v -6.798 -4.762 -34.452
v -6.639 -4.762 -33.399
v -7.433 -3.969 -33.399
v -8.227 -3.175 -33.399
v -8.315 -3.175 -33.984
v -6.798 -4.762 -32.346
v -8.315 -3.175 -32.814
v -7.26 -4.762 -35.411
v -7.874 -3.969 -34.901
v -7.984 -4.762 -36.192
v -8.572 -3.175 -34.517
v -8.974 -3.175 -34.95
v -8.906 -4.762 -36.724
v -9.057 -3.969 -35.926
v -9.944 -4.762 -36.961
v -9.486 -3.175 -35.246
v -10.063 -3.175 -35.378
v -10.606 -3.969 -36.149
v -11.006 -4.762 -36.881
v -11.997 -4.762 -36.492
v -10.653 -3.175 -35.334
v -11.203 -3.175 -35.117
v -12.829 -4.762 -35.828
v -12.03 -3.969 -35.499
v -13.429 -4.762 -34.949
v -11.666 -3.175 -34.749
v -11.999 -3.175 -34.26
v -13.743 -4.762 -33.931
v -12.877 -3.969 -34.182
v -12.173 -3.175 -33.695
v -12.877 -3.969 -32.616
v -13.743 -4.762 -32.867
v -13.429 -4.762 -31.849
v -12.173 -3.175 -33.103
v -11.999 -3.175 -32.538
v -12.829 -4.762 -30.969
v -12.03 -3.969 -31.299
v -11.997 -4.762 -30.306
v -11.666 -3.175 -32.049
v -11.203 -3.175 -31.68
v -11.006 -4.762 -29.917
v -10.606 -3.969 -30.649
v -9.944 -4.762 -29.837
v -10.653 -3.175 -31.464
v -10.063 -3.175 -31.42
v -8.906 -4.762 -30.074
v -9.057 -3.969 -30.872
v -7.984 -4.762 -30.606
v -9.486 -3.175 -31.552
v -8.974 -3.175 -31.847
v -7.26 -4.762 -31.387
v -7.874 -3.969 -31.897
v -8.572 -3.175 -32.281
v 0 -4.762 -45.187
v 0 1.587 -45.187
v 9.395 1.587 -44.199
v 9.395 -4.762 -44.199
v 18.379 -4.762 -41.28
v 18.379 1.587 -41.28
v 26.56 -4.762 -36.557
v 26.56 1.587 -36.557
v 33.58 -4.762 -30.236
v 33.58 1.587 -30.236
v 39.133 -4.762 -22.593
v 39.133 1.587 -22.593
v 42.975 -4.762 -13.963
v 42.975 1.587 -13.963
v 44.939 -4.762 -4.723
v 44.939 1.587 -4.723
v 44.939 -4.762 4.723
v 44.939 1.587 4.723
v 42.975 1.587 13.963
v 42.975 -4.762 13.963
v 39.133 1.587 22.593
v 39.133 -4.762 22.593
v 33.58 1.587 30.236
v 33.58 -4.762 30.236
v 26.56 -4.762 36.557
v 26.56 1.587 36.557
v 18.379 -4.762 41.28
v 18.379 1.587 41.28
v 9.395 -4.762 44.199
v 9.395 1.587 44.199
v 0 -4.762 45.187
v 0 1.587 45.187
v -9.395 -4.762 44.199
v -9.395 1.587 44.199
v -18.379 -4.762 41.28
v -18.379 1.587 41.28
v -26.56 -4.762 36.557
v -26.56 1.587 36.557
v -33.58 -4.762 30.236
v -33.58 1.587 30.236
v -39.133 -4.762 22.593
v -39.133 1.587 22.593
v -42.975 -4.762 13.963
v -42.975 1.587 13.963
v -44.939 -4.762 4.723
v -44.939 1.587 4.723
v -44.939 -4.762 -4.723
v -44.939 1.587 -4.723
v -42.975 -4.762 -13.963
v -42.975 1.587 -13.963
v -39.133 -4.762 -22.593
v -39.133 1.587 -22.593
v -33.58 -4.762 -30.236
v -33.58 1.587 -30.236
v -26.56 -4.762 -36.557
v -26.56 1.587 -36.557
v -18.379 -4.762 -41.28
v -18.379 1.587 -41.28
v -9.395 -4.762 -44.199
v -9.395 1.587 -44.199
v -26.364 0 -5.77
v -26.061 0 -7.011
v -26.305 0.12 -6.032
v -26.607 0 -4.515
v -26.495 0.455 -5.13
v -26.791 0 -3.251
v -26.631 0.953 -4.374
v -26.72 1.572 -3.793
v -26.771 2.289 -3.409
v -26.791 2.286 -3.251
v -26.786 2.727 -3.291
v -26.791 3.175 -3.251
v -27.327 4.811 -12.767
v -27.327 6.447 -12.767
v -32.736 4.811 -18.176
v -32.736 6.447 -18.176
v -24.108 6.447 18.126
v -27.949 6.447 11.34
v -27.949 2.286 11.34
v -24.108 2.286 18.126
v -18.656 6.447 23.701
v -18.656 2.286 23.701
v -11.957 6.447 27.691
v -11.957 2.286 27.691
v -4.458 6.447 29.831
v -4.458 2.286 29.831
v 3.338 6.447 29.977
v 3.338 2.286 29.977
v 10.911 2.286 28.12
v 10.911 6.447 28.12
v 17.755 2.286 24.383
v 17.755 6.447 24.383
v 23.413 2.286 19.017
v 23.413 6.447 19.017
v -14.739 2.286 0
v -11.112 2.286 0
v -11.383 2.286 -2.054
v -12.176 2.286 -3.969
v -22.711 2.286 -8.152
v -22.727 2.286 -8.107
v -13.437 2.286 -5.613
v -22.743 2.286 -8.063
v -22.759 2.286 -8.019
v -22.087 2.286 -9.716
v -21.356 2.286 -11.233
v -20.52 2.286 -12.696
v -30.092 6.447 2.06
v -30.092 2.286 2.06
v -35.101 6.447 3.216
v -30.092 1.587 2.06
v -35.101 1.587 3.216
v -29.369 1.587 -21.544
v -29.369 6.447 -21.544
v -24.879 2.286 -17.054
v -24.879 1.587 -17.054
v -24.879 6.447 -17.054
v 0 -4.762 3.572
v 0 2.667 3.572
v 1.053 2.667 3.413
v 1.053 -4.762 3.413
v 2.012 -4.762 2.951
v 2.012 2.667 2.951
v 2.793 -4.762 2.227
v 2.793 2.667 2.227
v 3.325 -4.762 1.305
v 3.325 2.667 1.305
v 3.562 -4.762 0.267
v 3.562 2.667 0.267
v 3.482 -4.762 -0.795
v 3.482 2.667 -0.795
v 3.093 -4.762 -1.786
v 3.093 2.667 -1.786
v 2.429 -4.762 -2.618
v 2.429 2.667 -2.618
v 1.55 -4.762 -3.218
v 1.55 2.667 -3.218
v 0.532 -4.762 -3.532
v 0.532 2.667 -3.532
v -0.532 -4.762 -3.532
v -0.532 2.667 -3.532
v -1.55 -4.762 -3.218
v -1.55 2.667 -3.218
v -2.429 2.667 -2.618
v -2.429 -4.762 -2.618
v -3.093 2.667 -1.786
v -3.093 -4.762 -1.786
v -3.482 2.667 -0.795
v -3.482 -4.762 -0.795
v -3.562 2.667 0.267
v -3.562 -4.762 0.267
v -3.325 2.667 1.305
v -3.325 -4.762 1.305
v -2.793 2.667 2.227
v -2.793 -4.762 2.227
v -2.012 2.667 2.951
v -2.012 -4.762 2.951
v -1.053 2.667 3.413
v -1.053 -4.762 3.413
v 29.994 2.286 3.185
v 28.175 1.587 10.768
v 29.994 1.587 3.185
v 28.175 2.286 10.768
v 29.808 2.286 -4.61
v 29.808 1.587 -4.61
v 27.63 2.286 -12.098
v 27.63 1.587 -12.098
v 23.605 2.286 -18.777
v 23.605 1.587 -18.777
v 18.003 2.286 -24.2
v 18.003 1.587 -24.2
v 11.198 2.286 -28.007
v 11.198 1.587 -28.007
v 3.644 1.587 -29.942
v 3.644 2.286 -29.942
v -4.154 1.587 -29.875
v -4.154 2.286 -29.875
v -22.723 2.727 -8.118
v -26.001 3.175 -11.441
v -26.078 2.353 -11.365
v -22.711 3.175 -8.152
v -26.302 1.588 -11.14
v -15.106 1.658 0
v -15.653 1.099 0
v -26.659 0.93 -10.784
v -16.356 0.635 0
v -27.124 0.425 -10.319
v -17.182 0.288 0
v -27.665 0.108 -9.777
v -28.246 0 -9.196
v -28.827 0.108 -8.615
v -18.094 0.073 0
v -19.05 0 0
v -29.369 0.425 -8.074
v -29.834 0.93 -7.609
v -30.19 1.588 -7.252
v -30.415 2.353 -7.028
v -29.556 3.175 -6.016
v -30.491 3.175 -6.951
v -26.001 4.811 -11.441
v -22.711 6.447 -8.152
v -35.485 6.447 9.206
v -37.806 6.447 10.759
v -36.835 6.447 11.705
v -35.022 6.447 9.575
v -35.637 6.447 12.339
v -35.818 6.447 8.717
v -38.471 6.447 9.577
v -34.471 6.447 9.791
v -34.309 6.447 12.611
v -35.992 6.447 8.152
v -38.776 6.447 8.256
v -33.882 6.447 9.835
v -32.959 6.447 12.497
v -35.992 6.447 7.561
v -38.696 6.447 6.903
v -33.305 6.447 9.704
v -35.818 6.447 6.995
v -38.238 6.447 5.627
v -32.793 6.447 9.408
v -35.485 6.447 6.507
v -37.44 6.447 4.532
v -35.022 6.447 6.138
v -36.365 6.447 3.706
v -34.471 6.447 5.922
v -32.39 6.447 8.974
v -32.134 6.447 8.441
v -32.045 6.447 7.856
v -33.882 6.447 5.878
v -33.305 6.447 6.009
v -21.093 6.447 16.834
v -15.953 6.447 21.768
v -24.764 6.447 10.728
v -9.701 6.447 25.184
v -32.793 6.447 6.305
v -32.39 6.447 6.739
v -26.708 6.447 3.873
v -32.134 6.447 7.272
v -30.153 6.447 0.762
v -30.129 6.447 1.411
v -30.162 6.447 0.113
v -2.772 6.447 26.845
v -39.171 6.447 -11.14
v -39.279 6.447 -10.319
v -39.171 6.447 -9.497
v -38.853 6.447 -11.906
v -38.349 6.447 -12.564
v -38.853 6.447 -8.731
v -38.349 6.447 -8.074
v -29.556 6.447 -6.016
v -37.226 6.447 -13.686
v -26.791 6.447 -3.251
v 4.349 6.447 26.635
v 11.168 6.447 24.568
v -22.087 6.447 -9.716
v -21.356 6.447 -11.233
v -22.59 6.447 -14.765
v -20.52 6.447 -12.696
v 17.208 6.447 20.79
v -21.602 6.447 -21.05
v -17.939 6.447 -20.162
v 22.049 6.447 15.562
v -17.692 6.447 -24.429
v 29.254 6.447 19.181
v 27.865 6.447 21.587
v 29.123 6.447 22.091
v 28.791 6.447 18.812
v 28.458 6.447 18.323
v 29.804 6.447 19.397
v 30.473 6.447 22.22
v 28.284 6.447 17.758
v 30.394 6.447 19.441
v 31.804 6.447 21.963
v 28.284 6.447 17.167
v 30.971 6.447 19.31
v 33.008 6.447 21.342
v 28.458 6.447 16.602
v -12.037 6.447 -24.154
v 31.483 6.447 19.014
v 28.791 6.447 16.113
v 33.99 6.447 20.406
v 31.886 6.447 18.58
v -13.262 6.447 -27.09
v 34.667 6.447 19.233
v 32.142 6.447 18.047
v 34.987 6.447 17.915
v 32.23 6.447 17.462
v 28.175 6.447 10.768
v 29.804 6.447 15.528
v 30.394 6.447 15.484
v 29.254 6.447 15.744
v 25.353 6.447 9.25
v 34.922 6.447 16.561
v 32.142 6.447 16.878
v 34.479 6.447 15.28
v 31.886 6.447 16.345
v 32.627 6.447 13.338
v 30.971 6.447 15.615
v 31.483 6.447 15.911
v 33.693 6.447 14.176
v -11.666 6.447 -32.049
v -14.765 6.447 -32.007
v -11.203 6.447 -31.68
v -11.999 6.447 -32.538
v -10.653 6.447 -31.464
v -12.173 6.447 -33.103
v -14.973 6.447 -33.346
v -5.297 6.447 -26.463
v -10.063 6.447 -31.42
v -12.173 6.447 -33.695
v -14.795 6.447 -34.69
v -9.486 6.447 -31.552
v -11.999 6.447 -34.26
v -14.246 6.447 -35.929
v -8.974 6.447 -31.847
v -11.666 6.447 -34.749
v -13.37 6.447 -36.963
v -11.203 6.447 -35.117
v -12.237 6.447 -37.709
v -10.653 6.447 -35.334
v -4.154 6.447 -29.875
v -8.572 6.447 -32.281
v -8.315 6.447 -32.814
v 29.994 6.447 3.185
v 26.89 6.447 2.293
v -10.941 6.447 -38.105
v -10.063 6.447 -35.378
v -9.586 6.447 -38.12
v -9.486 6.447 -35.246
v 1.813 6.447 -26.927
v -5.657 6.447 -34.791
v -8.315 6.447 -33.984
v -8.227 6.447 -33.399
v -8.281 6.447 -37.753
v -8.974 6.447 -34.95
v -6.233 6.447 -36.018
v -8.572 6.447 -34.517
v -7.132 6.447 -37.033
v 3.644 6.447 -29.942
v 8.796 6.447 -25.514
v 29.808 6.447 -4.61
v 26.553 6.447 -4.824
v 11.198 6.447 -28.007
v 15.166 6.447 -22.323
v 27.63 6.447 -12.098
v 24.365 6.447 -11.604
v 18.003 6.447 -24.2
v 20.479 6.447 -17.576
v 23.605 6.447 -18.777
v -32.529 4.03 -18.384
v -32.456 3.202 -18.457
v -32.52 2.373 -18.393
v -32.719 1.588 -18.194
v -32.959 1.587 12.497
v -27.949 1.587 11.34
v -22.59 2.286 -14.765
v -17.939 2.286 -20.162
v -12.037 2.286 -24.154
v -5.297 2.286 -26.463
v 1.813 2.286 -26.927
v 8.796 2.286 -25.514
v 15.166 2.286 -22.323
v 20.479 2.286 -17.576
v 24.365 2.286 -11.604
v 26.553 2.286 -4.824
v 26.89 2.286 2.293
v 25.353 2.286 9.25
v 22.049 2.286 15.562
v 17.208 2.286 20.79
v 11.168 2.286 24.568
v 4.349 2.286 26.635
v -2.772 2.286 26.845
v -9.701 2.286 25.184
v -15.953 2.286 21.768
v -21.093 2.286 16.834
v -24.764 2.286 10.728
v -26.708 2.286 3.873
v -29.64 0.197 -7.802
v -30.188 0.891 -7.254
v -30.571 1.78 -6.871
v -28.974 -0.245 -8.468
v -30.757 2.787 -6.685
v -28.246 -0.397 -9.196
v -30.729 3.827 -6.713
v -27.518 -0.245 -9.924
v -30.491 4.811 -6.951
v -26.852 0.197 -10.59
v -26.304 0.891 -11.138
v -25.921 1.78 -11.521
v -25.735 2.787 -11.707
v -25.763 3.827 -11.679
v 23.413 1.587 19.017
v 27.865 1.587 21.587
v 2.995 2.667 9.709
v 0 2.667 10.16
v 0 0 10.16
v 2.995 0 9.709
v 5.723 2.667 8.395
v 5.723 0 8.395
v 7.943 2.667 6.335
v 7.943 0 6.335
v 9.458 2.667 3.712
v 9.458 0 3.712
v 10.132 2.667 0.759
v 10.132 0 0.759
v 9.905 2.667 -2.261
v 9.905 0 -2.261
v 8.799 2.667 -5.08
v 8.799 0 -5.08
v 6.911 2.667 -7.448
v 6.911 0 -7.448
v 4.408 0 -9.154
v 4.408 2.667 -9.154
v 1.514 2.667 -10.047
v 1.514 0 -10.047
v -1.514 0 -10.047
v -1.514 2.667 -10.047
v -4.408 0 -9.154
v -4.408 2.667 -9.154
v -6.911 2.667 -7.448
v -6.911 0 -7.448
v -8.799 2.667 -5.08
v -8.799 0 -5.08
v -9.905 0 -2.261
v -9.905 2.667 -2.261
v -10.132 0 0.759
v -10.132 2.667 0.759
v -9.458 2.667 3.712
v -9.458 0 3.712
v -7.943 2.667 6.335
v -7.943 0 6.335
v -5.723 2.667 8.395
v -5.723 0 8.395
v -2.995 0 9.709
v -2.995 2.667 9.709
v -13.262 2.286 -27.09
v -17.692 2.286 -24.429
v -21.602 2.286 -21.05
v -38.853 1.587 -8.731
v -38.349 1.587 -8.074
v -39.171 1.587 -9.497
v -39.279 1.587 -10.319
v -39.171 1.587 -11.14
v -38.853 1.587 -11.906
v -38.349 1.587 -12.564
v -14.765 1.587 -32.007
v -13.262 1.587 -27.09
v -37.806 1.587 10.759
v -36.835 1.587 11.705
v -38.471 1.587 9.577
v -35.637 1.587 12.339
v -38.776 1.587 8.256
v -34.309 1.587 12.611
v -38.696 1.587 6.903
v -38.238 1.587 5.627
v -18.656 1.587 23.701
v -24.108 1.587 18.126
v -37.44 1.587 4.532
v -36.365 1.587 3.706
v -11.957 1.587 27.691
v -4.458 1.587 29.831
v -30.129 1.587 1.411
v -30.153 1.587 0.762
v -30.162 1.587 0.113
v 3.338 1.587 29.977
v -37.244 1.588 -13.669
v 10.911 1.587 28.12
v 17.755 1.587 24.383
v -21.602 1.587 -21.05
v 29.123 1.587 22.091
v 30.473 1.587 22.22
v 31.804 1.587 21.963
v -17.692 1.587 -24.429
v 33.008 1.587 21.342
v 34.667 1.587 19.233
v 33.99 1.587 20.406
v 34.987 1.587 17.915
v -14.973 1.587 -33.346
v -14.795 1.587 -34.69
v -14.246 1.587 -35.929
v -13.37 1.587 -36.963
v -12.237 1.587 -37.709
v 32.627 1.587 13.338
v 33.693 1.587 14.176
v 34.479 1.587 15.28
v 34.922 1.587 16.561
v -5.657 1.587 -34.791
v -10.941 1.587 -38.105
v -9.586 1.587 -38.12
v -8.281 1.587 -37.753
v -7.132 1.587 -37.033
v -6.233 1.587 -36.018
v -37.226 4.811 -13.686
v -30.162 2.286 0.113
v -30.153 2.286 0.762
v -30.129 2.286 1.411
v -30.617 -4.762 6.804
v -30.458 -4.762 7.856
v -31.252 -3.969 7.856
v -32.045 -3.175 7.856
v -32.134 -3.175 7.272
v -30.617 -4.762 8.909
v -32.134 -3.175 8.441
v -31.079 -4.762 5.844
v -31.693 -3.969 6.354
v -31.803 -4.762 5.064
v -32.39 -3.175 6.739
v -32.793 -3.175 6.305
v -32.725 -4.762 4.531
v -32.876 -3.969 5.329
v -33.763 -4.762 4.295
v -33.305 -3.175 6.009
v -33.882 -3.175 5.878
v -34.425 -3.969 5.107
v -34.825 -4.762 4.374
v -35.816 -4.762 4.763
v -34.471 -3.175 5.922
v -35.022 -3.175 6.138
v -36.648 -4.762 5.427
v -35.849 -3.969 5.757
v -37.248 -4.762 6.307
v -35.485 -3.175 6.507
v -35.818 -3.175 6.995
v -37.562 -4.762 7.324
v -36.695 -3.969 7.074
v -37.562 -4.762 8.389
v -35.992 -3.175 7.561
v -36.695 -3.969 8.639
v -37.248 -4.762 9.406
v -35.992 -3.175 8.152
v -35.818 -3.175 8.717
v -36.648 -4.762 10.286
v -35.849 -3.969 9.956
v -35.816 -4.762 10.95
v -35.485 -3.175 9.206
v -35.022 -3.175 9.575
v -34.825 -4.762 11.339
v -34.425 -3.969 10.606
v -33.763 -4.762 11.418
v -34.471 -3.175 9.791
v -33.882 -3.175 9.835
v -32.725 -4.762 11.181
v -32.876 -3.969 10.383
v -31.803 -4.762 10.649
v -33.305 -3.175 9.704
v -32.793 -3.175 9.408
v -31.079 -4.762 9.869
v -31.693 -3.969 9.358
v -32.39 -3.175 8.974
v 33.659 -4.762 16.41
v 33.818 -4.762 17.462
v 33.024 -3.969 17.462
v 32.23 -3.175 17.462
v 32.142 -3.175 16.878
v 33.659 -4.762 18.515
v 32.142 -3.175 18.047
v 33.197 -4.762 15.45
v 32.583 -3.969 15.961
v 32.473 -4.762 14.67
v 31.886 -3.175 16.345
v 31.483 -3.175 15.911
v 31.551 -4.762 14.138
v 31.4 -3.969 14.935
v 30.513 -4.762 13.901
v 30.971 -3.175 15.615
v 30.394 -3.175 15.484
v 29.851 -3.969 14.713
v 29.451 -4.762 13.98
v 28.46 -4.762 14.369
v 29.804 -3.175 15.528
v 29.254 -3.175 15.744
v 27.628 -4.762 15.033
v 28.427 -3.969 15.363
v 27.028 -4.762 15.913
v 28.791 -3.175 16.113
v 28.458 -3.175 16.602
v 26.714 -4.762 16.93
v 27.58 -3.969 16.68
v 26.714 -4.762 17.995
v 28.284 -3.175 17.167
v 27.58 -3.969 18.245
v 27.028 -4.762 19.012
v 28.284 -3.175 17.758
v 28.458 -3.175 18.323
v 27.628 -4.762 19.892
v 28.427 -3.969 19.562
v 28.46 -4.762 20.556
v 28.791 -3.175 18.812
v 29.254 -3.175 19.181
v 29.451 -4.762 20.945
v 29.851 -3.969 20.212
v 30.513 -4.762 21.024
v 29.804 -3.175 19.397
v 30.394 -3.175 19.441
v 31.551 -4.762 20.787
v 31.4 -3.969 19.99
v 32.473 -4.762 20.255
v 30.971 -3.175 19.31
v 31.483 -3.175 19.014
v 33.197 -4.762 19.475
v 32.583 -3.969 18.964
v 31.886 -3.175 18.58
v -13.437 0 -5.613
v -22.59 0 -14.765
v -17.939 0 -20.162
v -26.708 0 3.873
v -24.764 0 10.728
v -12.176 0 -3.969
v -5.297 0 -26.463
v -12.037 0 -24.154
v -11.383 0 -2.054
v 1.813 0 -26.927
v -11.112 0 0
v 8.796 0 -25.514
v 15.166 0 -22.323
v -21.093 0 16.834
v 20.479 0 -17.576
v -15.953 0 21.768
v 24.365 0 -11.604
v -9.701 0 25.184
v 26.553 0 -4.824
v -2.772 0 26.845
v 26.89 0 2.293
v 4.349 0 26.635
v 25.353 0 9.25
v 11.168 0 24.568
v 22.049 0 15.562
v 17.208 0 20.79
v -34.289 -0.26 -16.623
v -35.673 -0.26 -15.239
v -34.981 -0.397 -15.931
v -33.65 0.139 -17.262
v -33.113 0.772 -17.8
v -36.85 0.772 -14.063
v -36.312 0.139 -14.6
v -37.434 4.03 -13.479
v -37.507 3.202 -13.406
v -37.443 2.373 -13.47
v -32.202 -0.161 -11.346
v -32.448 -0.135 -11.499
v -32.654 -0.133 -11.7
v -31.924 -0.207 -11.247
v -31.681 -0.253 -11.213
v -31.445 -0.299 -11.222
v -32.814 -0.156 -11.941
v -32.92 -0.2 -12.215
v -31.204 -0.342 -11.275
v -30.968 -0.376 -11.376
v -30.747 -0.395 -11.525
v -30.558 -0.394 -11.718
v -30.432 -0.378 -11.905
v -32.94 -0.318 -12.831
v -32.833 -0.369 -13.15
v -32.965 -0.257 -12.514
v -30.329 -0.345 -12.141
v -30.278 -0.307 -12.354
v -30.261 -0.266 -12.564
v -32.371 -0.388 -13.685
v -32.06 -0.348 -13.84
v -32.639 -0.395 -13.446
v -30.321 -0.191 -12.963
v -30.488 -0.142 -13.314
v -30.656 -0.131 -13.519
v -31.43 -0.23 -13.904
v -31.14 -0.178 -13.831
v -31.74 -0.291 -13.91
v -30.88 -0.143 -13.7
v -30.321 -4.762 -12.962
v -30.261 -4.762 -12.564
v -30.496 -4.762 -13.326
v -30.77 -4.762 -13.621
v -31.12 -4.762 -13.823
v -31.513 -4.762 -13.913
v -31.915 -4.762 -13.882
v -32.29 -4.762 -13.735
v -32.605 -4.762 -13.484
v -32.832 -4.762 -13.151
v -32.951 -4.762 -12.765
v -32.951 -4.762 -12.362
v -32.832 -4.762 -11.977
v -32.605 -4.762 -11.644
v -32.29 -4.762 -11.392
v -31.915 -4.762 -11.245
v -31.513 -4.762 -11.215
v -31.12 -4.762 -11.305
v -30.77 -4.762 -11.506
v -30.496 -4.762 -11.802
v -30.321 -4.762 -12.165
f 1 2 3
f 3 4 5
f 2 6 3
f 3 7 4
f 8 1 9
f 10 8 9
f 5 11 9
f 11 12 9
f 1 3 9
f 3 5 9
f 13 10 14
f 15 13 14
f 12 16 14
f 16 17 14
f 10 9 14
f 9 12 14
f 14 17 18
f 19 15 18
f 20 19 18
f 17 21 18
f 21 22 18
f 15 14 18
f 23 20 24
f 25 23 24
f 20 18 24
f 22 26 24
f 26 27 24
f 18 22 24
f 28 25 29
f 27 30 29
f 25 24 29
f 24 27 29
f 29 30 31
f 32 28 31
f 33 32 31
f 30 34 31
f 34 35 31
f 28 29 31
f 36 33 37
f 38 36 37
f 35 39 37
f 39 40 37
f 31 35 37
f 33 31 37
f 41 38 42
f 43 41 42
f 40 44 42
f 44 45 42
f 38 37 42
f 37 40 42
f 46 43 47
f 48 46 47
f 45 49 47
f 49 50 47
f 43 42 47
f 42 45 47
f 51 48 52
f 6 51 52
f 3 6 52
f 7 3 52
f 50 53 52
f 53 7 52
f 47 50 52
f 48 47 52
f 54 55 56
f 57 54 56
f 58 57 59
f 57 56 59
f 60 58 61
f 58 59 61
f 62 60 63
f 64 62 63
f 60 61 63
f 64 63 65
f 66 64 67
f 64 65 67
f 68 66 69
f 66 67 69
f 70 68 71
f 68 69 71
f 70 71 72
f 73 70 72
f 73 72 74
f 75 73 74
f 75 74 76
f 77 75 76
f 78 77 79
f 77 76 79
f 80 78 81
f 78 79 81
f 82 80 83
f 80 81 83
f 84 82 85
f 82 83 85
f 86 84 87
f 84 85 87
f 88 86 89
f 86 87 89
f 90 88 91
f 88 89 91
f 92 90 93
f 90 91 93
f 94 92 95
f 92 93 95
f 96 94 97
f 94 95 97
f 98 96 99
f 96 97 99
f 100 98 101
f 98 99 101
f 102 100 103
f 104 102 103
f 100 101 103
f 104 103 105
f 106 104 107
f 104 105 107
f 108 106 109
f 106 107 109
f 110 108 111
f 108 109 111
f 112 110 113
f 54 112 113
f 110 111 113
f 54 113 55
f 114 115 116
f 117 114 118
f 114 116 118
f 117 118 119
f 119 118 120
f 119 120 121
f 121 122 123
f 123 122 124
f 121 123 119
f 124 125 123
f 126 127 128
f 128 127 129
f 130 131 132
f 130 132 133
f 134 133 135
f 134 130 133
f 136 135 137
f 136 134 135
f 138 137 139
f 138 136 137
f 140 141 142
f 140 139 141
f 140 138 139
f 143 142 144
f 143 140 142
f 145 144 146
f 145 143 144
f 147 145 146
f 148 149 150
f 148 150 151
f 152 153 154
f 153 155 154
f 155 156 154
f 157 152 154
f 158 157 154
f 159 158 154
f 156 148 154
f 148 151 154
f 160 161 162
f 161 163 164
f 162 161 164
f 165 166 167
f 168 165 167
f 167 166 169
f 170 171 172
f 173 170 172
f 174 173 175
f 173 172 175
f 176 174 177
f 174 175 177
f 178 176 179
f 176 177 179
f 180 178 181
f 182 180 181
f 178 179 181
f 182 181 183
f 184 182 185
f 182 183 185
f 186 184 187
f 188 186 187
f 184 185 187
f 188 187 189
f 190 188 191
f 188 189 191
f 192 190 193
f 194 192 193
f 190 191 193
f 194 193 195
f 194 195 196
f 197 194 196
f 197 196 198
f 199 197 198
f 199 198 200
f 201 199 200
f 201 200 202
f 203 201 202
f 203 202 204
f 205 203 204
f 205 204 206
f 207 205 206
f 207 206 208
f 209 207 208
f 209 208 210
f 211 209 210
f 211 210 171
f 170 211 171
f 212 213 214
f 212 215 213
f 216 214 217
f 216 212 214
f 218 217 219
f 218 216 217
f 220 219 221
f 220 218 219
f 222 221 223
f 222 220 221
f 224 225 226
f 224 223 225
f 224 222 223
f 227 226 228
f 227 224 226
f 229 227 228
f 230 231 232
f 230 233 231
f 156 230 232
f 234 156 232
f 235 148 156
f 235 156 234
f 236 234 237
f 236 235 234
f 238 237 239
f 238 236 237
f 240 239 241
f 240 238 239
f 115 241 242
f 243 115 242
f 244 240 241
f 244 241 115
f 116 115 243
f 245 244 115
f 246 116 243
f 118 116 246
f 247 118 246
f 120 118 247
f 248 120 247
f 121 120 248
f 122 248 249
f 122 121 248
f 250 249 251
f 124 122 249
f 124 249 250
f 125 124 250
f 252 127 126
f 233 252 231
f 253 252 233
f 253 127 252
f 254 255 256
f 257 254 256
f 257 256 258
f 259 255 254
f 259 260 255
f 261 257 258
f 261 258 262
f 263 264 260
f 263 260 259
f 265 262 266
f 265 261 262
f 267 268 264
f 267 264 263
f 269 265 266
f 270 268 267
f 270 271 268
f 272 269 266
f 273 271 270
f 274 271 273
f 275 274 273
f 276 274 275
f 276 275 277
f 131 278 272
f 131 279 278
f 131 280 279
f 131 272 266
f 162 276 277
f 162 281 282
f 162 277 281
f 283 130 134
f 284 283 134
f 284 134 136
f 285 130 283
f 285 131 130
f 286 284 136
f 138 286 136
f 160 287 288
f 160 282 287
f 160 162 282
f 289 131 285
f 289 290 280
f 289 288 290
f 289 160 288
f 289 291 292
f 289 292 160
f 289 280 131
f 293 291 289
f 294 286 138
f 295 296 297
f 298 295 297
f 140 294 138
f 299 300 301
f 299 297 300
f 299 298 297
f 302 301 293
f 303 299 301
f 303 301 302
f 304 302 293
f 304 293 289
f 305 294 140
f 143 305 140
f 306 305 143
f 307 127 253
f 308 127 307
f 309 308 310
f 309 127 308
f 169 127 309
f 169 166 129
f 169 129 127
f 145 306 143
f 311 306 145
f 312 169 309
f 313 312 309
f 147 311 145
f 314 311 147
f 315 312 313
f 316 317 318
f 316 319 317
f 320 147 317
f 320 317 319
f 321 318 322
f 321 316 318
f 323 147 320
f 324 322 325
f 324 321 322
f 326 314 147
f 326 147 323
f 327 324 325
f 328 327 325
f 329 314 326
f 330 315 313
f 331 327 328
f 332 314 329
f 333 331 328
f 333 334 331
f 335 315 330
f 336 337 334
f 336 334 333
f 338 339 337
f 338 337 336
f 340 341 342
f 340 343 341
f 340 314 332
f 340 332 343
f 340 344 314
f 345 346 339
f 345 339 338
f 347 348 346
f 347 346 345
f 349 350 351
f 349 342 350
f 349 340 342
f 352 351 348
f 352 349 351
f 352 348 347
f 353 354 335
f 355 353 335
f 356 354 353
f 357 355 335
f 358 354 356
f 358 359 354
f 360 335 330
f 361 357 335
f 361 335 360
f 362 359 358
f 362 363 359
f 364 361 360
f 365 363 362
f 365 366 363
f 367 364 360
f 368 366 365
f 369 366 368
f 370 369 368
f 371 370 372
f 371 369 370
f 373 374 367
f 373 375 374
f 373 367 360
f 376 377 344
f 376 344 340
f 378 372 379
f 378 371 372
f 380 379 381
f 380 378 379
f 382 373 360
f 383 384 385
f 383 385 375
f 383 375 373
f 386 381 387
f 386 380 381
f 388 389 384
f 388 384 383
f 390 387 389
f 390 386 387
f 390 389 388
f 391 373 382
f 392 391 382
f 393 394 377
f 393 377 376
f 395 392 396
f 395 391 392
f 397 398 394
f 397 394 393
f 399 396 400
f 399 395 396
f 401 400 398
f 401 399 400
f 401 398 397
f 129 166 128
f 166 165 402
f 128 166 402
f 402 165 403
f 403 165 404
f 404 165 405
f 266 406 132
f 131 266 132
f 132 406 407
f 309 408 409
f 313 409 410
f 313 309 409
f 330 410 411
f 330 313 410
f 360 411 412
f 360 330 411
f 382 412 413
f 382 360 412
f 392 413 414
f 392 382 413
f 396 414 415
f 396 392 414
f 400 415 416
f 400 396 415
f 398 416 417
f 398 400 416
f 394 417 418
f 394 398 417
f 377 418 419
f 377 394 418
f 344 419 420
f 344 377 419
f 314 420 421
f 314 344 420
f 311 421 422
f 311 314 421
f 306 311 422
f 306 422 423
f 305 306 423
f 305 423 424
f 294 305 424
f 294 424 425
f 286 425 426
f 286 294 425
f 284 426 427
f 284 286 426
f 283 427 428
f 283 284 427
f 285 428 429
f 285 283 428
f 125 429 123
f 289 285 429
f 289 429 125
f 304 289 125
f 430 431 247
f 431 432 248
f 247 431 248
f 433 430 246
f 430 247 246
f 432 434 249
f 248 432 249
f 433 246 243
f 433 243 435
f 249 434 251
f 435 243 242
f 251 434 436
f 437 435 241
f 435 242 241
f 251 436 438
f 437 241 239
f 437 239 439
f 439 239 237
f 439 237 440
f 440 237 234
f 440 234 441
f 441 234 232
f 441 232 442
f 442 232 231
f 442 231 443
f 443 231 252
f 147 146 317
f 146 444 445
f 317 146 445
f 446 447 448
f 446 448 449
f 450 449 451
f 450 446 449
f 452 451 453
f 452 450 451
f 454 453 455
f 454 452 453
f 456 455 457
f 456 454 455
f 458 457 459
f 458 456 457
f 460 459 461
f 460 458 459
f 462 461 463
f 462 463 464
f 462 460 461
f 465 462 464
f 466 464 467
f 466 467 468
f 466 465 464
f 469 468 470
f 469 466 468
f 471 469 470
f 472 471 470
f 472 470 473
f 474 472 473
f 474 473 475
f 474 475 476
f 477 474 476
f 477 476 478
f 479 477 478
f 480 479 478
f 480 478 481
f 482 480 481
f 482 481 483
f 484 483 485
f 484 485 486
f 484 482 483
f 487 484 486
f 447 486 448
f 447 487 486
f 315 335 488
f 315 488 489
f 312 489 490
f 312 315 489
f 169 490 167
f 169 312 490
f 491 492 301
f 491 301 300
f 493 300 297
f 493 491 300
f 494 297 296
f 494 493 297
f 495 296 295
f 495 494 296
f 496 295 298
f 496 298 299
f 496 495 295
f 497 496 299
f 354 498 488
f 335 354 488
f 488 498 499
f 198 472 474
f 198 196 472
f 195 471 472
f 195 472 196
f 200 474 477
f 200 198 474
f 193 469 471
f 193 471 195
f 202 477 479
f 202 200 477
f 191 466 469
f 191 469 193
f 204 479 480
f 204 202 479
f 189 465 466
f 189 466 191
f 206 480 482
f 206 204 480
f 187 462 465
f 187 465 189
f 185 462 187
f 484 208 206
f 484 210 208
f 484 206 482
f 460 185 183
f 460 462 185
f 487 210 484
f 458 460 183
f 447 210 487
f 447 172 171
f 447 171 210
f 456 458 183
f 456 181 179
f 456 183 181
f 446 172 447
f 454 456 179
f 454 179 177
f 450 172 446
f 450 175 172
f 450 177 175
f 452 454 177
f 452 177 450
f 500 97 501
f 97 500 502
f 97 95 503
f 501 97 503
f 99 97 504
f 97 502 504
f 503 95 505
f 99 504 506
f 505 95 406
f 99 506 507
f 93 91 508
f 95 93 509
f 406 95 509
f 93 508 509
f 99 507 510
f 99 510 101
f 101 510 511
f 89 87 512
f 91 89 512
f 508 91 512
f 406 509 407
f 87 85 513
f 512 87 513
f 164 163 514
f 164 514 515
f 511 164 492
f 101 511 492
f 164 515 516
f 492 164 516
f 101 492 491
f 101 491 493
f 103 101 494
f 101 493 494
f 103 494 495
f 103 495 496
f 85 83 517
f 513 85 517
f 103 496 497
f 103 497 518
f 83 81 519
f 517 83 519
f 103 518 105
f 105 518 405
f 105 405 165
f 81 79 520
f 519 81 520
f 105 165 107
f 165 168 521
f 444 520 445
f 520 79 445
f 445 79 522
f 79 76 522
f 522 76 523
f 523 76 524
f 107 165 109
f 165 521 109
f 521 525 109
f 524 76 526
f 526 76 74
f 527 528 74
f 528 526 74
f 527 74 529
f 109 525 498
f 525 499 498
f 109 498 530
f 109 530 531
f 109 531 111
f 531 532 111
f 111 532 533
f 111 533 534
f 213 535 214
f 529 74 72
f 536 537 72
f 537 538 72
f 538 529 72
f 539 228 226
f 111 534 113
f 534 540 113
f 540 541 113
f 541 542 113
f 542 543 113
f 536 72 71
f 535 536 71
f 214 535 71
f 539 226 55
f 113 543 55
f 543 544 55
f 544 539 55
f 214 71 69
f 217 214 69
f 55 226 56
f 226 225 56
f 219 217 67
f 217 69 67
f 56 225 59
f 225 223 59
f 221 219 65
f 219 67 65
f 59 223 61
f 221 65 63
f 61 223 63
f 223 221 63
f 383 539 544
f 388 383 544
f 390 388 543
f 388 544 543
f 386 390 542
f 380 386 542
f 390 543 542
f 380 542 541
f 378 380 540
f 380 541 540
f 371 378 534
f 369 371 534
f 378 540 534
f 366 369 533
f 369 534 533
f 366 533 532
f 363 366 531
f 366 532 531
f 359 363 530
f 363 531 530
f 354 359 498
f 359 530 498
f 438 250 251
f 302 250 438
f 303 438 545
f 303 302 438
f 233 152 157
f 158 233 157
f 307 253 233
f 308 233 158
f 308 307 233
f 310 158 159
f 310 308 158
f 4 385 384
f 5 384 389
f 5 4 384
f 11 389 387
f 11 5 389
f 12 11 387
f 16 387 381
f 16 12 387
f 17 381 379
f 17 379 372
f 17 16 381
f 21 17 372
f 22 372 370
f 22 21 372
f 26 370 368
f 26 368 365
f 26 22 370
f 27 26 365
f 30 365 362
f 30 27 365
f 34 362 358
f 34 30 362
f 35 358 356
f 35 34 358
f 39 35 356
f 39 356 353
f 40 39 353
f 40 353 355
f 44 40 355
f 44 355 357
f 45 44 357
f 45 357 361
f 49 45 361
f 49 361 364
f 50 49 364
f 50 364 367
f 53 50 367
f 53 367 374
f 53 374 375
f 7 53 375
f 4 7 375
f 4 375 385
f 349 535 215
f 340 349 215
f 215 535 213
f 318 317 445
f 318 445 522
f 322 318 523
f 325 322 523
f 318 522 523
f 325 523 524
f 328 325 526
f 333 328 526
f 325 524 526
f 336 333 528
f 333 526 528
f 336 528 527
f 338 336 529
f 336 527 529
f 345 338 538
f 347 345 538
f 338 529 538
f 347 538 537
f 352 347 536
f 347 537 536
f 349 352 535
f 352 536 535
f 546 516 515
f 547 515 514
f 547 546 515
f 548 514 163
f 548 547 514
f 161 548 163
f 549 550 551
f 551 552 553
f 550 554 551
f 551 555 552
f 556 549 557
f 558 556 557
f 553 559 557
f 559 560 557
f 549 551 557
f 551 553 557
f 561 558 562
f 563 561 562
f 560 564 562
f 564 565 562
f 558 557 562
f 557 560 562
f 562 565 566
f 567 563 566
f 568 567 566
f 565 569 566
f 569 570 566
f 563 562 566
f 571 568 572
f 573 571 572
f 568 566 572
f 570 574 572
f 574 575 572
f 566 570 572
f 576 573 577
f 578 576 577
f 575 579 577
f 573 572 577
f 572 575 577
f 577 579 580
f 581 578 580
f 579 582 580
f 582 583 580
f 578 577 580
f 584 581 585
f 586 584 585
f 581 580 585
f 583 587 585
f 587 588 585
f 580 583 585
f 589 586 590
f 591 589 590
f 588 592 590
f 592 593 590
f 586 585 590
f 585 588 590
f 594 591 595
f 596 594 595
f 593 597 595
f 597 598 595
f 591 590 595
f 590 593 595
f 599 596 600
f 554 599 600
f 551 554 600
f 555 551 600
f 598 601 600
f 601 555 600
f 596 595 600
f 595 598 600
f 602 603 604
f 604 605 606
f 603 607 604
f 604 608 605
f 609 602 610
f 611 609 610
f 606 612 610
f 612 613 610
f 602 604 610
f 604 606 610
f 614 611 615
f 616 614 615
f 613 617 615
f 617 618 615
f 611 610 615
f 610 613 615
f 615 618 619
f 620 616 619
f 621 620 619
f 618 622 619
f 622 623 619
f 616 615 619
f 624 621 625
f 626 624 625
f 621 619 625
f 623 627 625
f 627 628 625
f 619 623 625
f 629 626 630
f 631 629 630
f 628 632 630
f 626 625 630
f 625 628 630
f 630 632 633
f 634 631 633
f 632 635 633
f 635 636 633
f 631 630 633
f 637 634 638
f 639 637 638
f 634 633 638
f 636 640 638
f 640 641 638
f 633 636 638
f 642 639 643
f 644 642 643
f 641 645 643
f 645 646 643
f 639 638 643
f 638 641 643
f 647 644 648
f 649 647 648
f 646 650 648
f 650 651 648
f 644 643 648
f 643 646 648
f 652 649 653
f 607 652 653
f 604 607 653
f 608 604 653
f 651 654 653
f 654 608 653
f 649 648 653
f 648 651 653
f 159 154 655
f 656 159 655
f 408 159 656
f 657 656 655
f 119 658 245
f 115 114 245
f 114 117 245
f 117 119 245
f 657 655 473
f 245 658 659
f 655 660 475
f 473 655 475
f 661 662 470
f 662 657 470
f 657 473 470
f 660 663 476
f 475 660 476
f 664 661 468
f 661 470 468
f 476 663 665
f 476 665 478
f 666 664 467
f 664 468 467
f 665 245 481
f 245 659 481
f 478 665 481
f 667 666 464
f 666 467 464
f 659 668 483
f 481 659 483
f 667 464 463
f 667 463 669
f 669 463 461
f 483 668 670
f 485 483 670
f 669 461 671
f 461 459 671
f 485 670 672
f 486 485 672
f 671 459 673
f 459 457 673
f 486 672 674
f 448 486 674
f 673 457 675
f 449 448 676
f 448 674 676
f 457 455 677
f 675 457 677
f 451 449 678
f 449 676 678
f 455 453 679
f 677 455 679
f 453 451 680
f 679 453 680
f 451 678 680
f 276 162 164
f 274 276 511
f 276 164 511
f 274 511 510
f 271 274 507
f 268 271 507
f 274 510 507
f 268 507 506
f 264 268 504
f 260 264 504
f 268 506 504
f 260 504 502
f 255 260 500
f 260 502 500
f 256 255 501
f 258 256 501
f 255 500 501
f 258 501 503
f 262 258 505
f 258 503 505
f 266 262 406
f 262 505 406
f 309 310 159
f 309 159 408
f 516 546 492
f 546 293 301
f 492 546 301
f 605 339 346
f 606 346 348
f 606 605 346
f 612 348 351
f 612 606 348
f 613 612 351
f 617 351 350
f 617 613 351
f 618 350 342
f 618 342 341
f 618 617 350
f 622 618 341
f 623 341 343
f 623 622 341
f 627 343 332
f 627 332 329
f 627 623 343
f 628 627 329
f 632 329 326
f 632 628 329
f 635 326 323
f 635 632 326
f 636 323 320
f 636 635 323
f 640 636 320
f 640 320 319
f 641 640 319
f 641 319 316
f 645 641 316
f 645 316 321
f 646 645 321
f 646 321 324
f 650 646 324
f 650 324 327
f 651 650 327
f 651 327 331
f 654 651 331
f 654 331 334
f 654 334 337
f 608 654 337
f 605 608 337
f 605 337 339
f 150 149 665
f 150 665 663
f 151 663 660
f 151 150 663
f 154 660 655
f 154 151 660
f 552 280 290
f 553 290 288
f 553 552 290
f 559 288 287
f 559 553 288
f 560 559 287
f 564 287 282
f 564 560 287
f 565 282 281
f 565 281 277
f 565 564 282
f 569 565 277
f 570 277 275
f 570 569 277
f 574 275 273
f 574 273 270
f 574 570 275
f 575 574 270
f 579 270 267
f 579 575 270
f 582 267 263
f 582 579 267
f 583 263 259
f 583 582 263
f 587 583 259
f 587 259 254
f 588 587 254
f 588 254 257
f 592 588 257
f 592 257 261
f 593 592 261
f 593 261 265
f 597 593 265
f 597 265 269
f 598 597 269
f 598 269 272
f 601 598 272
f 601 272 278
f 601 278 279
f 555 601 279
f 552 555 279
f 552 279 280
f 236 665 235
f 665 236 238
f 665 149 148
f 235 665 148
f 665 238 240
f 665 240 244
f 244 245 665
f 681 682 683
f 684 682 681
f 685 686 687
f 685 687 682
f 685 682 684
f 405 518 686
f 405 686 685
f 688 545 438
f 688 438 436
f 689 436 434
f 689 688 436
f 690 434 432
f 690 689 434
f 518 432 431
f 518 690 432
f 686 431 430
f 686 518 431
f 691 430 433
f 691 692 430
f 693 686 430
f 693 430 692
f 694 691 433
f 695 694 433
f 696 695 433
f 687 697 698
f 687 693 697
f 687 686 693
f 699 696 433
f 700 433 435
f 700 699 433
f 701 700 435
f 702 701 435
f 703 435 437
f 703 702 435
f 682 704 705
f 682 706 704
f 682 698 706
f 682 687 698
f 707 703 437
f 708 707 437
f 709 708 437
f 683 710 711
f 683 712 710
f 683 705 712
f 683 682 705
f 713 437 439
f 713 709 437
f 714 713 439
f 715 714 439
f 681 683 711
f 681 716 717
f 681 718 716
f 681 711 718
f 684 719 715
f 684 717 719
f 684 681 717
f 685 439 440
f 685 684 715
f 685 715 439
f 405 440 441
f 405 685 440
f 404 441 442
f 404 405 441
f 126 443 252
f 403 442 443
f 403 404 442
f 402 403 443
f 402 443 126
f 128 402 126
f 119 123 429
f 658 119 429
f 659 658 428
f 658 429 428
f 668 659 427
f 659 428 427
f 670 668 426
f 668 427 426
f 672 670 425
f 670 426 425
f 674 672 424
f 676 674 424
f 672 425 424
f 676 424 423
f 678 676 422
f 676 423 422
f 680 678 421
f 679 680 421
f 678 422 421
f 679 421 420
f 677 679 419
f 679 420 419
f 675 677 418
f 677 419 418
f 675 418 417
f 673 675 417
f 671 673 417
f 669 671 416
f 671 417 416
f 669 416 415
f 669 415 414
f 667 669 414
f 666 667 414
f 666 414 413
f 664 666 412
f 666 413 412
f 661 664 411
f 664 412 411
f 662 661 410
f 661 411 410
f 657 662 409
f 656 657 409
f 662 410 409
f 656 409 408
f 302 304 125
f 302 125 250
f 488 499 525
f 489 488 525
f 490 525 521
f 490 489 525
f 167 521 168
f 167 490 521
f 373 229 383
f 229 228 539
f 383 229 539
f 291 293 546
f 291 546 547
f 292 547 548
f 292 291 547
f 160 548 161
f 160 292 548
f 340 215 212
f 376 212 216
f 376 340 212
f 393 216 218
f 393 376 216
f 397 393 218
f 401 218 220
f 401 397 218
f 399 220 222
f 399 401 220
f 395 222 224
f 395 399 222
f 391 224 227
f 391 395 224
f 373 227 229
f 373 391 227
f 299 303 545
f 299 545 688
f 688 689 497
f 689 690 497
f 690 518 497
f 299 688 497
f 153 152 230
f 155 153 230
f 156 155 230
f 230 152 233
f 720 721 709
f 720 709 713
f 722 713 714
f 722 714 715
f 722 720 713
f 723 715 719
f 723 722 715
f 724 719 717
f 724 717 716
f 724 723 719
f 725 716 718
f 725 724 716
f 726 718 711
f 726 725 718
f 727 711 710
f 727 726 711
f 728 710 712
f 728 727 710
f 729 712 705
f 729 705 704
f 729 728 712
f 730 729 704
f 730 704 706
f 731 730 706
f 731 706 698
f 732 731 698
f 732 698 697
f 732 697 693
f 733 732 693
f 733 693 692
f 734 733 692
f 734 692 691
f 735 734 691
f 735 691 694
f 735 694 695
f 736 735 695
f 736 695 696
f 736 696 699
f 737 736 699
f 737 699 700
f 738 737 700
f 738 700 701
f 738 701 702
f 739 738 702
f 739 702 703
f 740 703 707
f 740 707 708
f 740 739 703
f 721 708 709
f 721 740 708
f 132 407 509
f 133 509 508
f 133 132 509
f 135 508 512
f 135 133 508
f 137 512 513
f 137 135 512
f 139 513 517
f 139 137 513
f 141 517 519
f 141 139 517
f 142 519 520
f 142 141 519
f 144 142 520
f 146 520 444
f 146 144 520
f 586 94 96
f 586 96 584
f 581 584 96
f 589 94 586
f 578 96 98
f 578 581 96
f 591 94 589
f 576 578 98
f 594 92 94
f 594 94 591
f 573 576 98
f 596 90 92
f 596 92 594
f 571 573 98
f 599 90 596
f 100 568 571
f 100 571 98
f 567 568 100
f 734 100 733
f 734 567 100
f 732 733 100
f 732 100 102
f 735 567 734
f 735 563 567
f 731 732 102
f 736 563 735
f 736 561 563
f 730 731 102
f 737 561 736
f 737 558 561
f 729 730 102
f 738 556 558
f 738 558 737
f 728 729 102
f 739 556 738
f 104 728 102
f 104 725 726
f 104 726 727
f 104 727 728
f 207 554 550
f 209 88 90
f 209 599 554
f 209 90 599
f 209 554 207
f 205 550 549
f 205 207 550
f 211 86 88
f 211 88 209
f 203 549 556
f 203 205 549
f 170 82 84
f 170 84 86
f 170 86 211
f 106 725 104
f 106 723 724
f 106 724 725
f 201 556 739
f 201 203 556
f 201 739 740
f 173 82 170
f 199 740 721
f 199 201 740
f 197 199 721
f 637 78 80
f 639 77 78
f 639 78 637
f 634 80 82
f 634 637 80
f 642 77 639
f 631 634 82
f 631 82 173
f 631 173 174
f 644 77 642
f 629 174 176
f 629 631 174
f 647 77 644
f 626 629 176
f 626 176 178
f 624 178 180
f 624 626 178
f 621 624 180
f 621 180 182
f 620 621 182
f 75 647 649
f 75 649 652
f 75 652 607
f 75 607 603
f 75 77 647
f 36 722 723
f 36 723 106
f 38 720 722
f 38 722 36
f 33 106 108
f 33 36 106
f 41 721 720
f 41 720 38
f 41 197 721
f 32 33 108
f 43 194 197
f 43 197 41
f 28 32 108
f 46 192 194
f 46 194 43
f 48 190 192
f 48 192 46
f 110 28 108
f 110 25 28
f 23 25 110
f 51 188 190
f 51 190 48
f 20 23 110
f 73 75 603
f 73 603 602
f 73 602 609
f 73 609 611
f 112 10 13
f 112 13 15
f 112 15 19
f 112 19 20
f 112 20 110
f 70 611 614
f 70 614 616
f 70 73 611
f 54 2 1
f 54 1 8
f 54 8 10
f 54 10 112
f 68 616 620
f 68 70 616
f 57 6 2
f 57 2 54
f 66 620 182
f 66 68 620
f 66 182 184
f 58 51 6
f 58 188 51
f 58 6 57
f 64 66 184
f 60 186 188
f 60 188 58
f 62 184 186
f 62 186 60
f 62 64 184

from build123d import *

# Parameters (mm, degrees)
SKETCH1_R          = 30.1625
SKETCH1_R_2        = 3.571875
EXTRUDE1_DEPTH     = 4.7625
EXTRUDE2_START     = 2.286
SKETCH2_R          = 30.1625
SKETCH2_R_2        = 26.9875
EXTRUDE2_DEPTH     = 2.286
EXTRUDE3_START     = 2.286
EXTRUDE3_DEPTH     = 2.286
CUT_EXTRUDE1_START = -2.286
CUT_EXTRUDE1_DEPTH = 2.286
EXTRUDE4_START     = 4.16052
EXTRUDE4_DEPTH     = 4.16052
EXTRUDE6_START     = -4.7625
EXTRUDE6_DEPTH     = 4.7625
EXTRUDE7_START     = 6.44652
EXTRUDE7_DEPTH     = 6.44652
FILLET1_R          = 3.175
EXTRUDE8_START     = -4.7625
EXTRUDE8_OUTLINE_R = 1.984375
EXTRUDE8_DEPTH     = 11.20902
EXTRUDE8_START_2   = -36.000693059
EXTRUDE8_2_DEPTH   = 9.525
EXTRUDE9_START     = 2.667
SKETCH11_R         = 10.16
SKETCH11_R_2       = 3.571875
EXTRUDE9_DEPTH     = 2.667
SPLIT1_START       = -4.7625
SPLIT1_OUTLINE_R   = 1.35255
SPLIT1_DEPTH       = 11.20902
EXTRUDE10_START    = -6.35
SKETCH13_R         = 45.1866
EXTRUDE10_DEPTH    = 6.35


# Read off the part's stored shape, not the designer's step: Extrude8, Split1
with BuildPart() as part:
    # Sketch1 → Extrude1 (new body)
    with BuildSketch(Plane(origin=(0, 0, 0), x_dir=(1, 0, 0), z_dir=(0, 1, 0))):
        with Locations(Location((0, 0, 0), (0, 0, 270))):
            Circle(SKETCH1_R)
        with Locations(Location((0, 0, 0), (0, 0, 270))):
            Circle(SKETCH1_R_2, mode=Mode.SUBTRACT)
    extrude(amount=-EXTRUDE1_DEPTH)

    # Sketch2 → Extrude2 (add)
    with BuildSketch(Plane(origin=(0, 0, 0), x_dir=(-1, 0, 0), z_dir=(0, 1, 0)).offset(EXTRUDE2_START)):
        with Locations(Location((0, 0, 0), (0, 0, 90))):
            Circle(SKETCH2_R)
        with Locations(Location((0, 0, 0), (0, 0, 90))):
            Circle(SKETCH2_R_2, mode=Mode.SUBTRACT)
    extrude(amount=-EXTRUDE2_DEPTH)

    # Sketch3 → Extrude3 (add)
    with BuildSketch(Plane(origin=(0, 0, 0), x_dir=(-1, 0, 0), z_dir=(0, 1, 0)).offset(EXTRUDE3_START)):
        with BuildLine():
            Line((24.919808713, -10.359936774), (14.559871939, 0))
            Line((14.559871939, 0), (11.1125, 0))
            ThreePointArc((11.1125, 0), (11.716706211, -3.037549744), (13.437339924, -5.612660076))
            Line((13.437339924, -5.612660076), (22.590031817, -14.765351968))
            ThreePointArc((22.590031817, -14.765351968), (23.856826226, -12.616536715), (24.919808713, -10.359936774))
        make_face()
    extrude(amount=-EXTRUDE3_DEPTH)

    # Sketch4 → Cut-Extrude1 (cut)
    with BuildSketch(Plane(origin=(0, 2.286, 0), x_dir=(-1, 0, 0), z_dir=(0, 1, 0)).offset(CUT_EXTRUDE1_START)):
        with BuildLine():
            Line((27.327148629, -12.767276689), (24.919808713, -10.359936774))
            ThreePointArc((24.919808713, -10.359936774), (26.098589577, -6.86940888), (26.790988464, -3.250860404))
            Line((26.790988464, -3.250860404), (29.556401367, -6.016273306))
            ThreePointArc((29.556401367, -6.016273306), (28.64137875, -9.457686268), (27.327148629, -12.767276689))
        make_face()
    extrude(amount=CUT_EXTRUDE1_DEPTH, mode=Mode.SUBTRACT)

    # Sketch5 → Extrude4 (add)
    with BuildSketch(Plane(origin=(0, 2.286, 0), x_dir=(-1, 0, 0), z_dir=(0, 1, 0)).offset(EXTRUDE4_START)):
        with BuildLine():
            ThreePointArc((29.556401367, -6.016273306), (-28.64137875, 9.457686268), (27.327148629, -12.767276689))
            Line((27.327148629, -12.767276689), (22.711429166, -8.151557227))
            ThreePointArc((22.711429166, -8.151557227), (21.734904661, -10.480974162), (20.52023101, -12.695551161))
            Line((20.52023101, -12.695551161), (22.590031817, -14.765351968))
            ThreePointArc((22.590031817, -14.765351968), (-25.352853291, 9.24975601), (26.790988464, -3.250860404))
            Line((26.790988464, -3.250860404), (29.556401367, -6.016273306))
        make_face()
    extrude(amount=-EXTRUDE4_DEPTH)

    # Sketch7 → Extrude6 (add)
    with BuildSketch(Plane.XZ.offset(4.7625).offset(EXTRUDE6_START)):
        with BuildLine():
            Line((-29.368674114, -21.543994265), (-24.878546053, -17.053866205))
            ThreePointArc((-24.878546053, -17.053866205), (-28.827919749, -8.872848988), (-30.162288209, 0.113031942))
            Line((-30.162288209, 0.113031942), (-40.593994265, -10.318674114))
            Line((-40.593994265, -10.318674114), (-29.368674114, -21.543994265))
        make_face()
    extrude(amount=EXTRUDE6_DEPTH)

    # Sketch8 → Extrude7 (add)
    with BuildSketch(Plane(origin=(0, 0, 0), x_dir=(-1, 0, 0), z_dir=(0, 1, 0)).offset(EXTRUDE7_START)):
        with BuildLine():
            Line((27.327148629, -12.767276689), (32.736270159, -18.17639822))
            Line((32.736270159, -18.17639822), (29.368674114, -21.543994265))
            Line((29.368674114, -21.543994265), (24.878546053, -17.053866205))
            ThreePointArc((24.878546053, -17.053866205), (26.190692082, -14.960750466), (27.327148629, -12.767276689))
        make_face()
        with BuildLine():
            Line((29.556401367, -6.016273306), (37.22639822, -13.686270159))
            Line((37.22639822, -13.686270159), (40.593994265, -10.318674114))
            Line((40.593994265, -10.318674114), (30.162288209, 0.113031942))
            ThreePointArc((30.162288209, 0.113031942), (30.016205071, -2.96712645), (29.556401367, -6.016273306))
        make_face()
    extrude(amount=-EXTRUDE7_DEPTH)

    # Fillet1
    # the kernel refuses this fillet: 3.175 mm, written as the material it adds along each edge
    with BuildSketch(Plane(origin=(-32.736270159, 0, -18.17639822), x_dir=(-0.7071067811865481, 0, 0.707106781186547), z_dir=(0.707106781186547, 0, 0.707106781186548))) as fillet1_piece_1_section:
        with BuildLine():
            CenterArc((FILLET1_R, -FILLET1_R), FILLET1_R, 90, 90)
            Line((0, -FILLET1_R), (0, 0))
            Line((0, 0), (FILLET1_R, 0))
        make_face()
    fillet1_piece_1 = extrude(amount=33.642808877, mode=Mode.PRIVATE)
    fillet1_piece_1 = split(fillet1_piece_1, bisect_by=Plane(origin=(-28.125346977, 2.286, -12.485884273), z_dir=(0, -1, 0)), keep=Keep.TOP, mode=Mode.PRIVATE)
    fillet1_piece_1 = fillet1_piece_1 - Plane(origin=(0, 0.637531041, 0), x_dir=(-0.9412113206103934, 0, -0.33781836829106776), z_dir=(0, 1, 0)) * Cylinder(24.13, 80, mode=Mode.PRIVATE)
    add(fillet1_piece_1)
    with BuildSketch(Plane(origin=(-32.736270159, 0, -18.17639822), x_dir=(-0.7071067811865481, 0, 0.707106781186547), z_dir=(0.707106781186547, 0, 0.707106781186548))) as fillet1_piece_2_section:
        with BuildLine():
            CenterArc((FILLET1_R, -FILLET1_R), FILLET1_R, 90, 90)
            Line((0, -FILLET1_R), (0, 0))
            Line((0, 0), (FILLET1_R, 0))
        make_face()
    fillet1_piece_2 = extrude(amount=33.642808877, mode=Mode.PRIVATE)
    fillet1_piece_2 = split(fillet1_piece_2, bisect_by=Plane(origin=(-27.721701516, 2.286, -13.167406565), z_dir=(0, 1, 0)), keep=Keep.TOP, mode=Mode.PRIVATE)
    fillet1_piece_2 = fillet1_piece_2 - Plane(origin=(0, 2.641516211, 0), x_dir=(-0.9412113206103934, 0, -0.33781836829106776), z_dir=(0, 1, 0)) * Cylinder(24.13, 80, mode=Mode.PRIVATE)
    add(fillet1_piece_2)
    with BuildSketch(Plane(origin=(-32.736270159, 0, -18.17639822), x_dir=(-0.7071067811865481, 0, 0.707106781186547), z_dir=(0.707106781186547, 0, 0.707106781186548))) as fillet1_piece_3_section:
        with BuildLine():
            CenterArc((FILLET1_R, -FILLET1_R), FILLET1_R, 90, 90)
            Line((0, -FILLET1_R), (0, 0))
            Line((0, 0), (FILLET1_R, 0))
        make_face()
    fillet1_piece_3 = extrude(amount=33.642808877, mode=Mode.PRIVATE)
    fillet1_piece_3 = split(fillet1_piece_3, bisect_by=Plane(origin=(-19.232138403, 0.68020426, 0), z_dir=(0, 0, -1)), keep=Keep.TOP, mode=Mode.PRIVATE)
    fillet1_piece_3 = split(fillet1_piece_3, bisect_by=Plane(origin=(-19.232138403, 2.286, -3.714419145), z_dir=(0, -1, 0)), keep=Keep.TOP, mode=Mode.PRIVATE)
    fillet1_piece_3 = fillet1_piece_3 & Plane(origin=(0, 0.68020426, 0), x_dir=(-0.9412113206103934, 0, -0.33781836829106776), z_dir=(0, 1, 0)) * Cylinder(24.13, 80, mode=Mode.PRIVATE)
    add(fillet1_piece_3)
    with BuildSketch(Plane(origin=(-21.178328388, 0, 2.361799672), x_dir=(0.7071067811865476, 0, -0.7071067811865474), z_dir=(-0.7071067811865474, 0, -0.7071067811865477))) as fillet1_piece_4_section:
        with BuildLine():
            CenterArc((FILLET1_R, -FILLET1_R), FILLET1_R, 90, 90)
            Line((0, -FILLET1_R), (0, 0))
            Line((0, 0), (FILLET1_R, 0))
        make_face()
    fillet1_piece_4 = extrude(amount=22.695398005, mode=Mode.PRIVATE)
    fillet1_piece_4 = fillet1_piece_4 - Plane(origin=(0, 0.732754622, 0), x_dir=(0, 0, 1), z_dir=(0, 1, 0)) * Cylinder(26.9875, 59, mode=Mode.PRIVATE)
    add(fillet1_piece_4)

    # Extrude8 outline → Extrude8 (add)
    # profile 1 of 3: a face of its own
    with BuildSketch(Plane(origin=(0, 0, 0), x_dir=(1, 0, 0), z_dir=(0, 1, 0)).offset(EXTRUDE8_START)):
        with BuildLine():
            ThreePointArc((-13.262441208, 27.090294562), (-8.818661544, 28.844542202), (-4.153638407, 29.87513505))
            Line((-4.153638407, 29.87513505), (-5.656680387, 34.791363846))
            ThreePointArc((-5.656680387, 34.791363846), (-11.603502031, 37.953345002), (-14.765483188, 32.006523358))
            Line((-14.765483188, 32.006523358), (-13.262441208, 27.090294562))
        make_face()
        with Locations((-10.211081787, 33.398943602)):
            Circle(EXTRUDE8_OUTLINE_R, mode=Mode.SUBTRACT)
    # profile 2 of 3: a face of its own
    with BuildSketch(Plane(origin=(0, 0, 0), x_dir=(1, 0, 0), z_dir=(0, 1, 0)).offset(EXTRUDE8_START)):
        with BuildLine():
            Line((-32.958545116, -12.496853006), (-27.949445097, -11.340411146))
            ThreePointArc((-27.949445097, -11.340411146), (-29.389437079, -6.785086176), (-30.09210389, -2.059536279))
            Line((-30.09210389, -2.059536279), (-35.101203909, -3.215978139))
            ThreePointArc((-35.101203909, -3.215978139), (-38.670311946, -8.927744969), (-32.958545116, -12.496853006))
        make_face()
        with Locations((-34.029874513, -7.856415573)):
            Circle(EXTRUDE8_OUTLINE_R, mode=Mode.SUBTRACT)
    # profile 3 of 3: a face of its own
    with BuildSketch(Plane(origin=(0, 0, 0), x_dir=(1, 0, 0), z_dir=(0, 1, 0)).offset(EXTRUDE8_START)):
        with BuildLine():
            Line((32.627187227, -13.338054014), (28.175071934, -10.767624052))
            ThreePointArc((28.175071934, -10.767624052), (26.121491241, -15.08125), (23.412571934, -19.016516022))
            Line((23.412571934, -19.016516022), (27.864687227, -21.586945986))
            ThreePointArc((27.864687227, -21.586945986), (34.370383213, -19.84375), (32.627187227, -13.338054014))
        make_face()
        with Locations((30.245937227, -17.4625)):
            Circle(EXTRUDE8_OUTLINE_R, mode=Mode.SUBTRACT)
    extrude(amount=EXTRUDE8_DEPTH)

    # Extrude8 2 outline → Extrude8 2 (cut)
    with BuildSketch(Plane(origin=(0, 0, 0), x_dir=(0.7071067811865474, 0, -0.7071067811865477), z_dir=(0.7071067811865476, 0, 0.7071067811865476)).offset(EXTRUDE8_START_2)):
        with BuildLine():
            ThreePointArc((-16.645384182, 4.811357545), (-13.470384182, -0.396875), (-10.295384182, 4.811357545))
            Line((-10.295384182, 4.811357545), (-10.295384182, 3.175))
            ThreePointArc((-10.295384182, 3.175), (-11.225320152, 0.92993597), (-13.470384182, 0))
            ThreePointArc((-13.470384182, 0), (-15.715448212, 0.92993597), (-16.645384182, 3.175))
            Line((-16.645384182, 3.175), (-16.645384182, 4.811357545))
        make_face()
    extrude(amount=EXTRUDE8_2_DEPTH, mode=Mode.SUBTRACT)

    # Sketch11 → Extrude9 (add)
    with BuildSketch(Plane(origin=(0, 0, 0), x_dir=(-1, 0, 0), z_dir=(0, 1, 0)).offset(EXTRUDE9_START)):
        with Locations(Location((0, 0, 0), (0, 0, 90))):
            Circle(SKETCH11_R)
        with Locations(Location((0, 0, 0), (0, 0, 90))):
            Circle(SKETCH11_R_2, mode=Mode.SUBTRACT)
    extrude(amount=-EXTRUDE9_DEPTH)

    # Split1 outline → Split1 (cut)
    with BuildSketch(Plane(origin=(0, 0, 0), x_dir=(1, 0, 0), z_dir=(0, 1, 0)).offset(SPLIT1_START)):
        with Locations((-31.613738144, 12.563738144)):
            Circle(SPLIT1_OUTLINE_R)
        with BuildLine():
            Line((-40.593994265, 10.318674114), (-38.348930235, 8.073610084))
            ThreePointArc((-38.348930235, 8.073610084), (-39.278866205, 10.318674114), (-38.348930235, 12.563738144))
            Line((-38.348930235, 12.563738144), (-40.593994265, 10.318674114))
        make_face()
    extrude(amount=SPLIT1_DEPTH, mode=Mode.SUBTRACT)

    # Split1 2 outline → Split1 2 (revolve, cut)
    with BuildSketch(Plane(origin=(30.245937227, 0, 17.4625), x_dir=(1, 0, 0), z_dir=(0, 0, 1))):
        Polygon((3.571875, -4.7625), (1.984375, -3.175), (1.984375, -4.7625), align=None)
    revolve(axis=Axis((30.245937227, 0, 17.4625), (0, 1, 0)), mode=Mode.SUBTRACT)

    # Split1 3 outline → Split1 3 (revolve, cut)
    with BuildSketch(Plane(origin=(-10.211081787, 0, -33.398943602), x_dir=(1, 0, 0), z_dir=(0, 0, 1))):
        Polygon((3.571875, -4.7625), (1.984375, -3.175), (1.984375, -4.7625), align=None)
    revolve(axis=Axis((-10.211081787, 0, -33.398943602), (0, 1, 0)), mode=Mode.SUBTRACT)

    # Split1 4 outline → Split1 4 (revolve, cut)
    with BuildSketch(Plane(origin=(-34.029874513, 0, 7.856415573), x_dir=(1, 0, 0), z_dir=(0, 0, 1))):
        Polygon((3.571875, -4.7625), (1.984375, -3.175), (1.984375, -4.7625), align=None)
    revolve(axis=Axis((-34.029874513, 0, 7.856415573), (0, 1, 0)), mode=Mode.SUBTRACT)

    # Sketch13 → Extrude10 (add)
    with BuildSketch(Plane.XZ.offset(4.7625).offset(EXTRUDE10_START)):
        with Locations(Location((0, 0, 0), (0, 0, 270))):
            Circle(SKETCH13_R)
        with BuildLine():
            Line((-30.162288209, 0.113031942), (-38.348930235, -8.073610084))
            ThreePointArc((-38.348930235, -8.073610084), (-39.278866205, -10.318674114), (-38.348930235, -12.563738144))
            Line((-38.348930235, -12.563738144), (-29.368674114, -21.543994265))
            Line((-29.368674114, -21.543994265), (-24.878546053, -17.053866205))
            ThreePointArc((-24.878546053, -17.053866205), (-19.719690689, -22.82345735), (-13.262441208, -27.090294562))
            Line((-13.262441208, -27.090294562), (-14.765483188, -32.006523358))
            ThreePointArc((-14.765483188, -32.006523358), (-11.603502031, -37.953345002), (-5.656680387, -34.791363846))
            Line((-5.656680387, -34.791363846), (-4.153638407, -29.87513505))
            ThreePointArc((-4.153638407, -29.87513505), (23.605418531, -18.776597728), (28.175071935, 10.767624052))
            Line((28.175071935, 10.767624052), (32.627187227, 13.338054014))
            ThreePointArc((32.627187227, 13.338054014), (34.370383213, 19.84375), (27.864687227, 21.586945986))
            Line((27.864687227, 21.586945986), (23.412571935, 19.016516023))
            ThreePointArc((23.412571935, 19.016516023), (-4.458301363, 29.831190979), (-27.949445098, 11.340411146))
            Line((-27.949445098, 11.340411146), (-32.958545116, 12.496853006))
            ThreePointArc((-32.958545116, 12.496853006), (-38.670311946, 8.927744969), (-35.101203909, 3.215978139))
            Line((-35.101203909, 3.215978139), (-30.092103891, 2.059536279))
            ThreePointArc((-30.092103891, 2.059536279), (-30.142912295, 1.086850785), (-30.162288209, 0.113031942))
        make_face(mode=Mode.SUBTRACT)
    extrude(amount=EXTRUDE10_DEPTH)


solid = part.part
